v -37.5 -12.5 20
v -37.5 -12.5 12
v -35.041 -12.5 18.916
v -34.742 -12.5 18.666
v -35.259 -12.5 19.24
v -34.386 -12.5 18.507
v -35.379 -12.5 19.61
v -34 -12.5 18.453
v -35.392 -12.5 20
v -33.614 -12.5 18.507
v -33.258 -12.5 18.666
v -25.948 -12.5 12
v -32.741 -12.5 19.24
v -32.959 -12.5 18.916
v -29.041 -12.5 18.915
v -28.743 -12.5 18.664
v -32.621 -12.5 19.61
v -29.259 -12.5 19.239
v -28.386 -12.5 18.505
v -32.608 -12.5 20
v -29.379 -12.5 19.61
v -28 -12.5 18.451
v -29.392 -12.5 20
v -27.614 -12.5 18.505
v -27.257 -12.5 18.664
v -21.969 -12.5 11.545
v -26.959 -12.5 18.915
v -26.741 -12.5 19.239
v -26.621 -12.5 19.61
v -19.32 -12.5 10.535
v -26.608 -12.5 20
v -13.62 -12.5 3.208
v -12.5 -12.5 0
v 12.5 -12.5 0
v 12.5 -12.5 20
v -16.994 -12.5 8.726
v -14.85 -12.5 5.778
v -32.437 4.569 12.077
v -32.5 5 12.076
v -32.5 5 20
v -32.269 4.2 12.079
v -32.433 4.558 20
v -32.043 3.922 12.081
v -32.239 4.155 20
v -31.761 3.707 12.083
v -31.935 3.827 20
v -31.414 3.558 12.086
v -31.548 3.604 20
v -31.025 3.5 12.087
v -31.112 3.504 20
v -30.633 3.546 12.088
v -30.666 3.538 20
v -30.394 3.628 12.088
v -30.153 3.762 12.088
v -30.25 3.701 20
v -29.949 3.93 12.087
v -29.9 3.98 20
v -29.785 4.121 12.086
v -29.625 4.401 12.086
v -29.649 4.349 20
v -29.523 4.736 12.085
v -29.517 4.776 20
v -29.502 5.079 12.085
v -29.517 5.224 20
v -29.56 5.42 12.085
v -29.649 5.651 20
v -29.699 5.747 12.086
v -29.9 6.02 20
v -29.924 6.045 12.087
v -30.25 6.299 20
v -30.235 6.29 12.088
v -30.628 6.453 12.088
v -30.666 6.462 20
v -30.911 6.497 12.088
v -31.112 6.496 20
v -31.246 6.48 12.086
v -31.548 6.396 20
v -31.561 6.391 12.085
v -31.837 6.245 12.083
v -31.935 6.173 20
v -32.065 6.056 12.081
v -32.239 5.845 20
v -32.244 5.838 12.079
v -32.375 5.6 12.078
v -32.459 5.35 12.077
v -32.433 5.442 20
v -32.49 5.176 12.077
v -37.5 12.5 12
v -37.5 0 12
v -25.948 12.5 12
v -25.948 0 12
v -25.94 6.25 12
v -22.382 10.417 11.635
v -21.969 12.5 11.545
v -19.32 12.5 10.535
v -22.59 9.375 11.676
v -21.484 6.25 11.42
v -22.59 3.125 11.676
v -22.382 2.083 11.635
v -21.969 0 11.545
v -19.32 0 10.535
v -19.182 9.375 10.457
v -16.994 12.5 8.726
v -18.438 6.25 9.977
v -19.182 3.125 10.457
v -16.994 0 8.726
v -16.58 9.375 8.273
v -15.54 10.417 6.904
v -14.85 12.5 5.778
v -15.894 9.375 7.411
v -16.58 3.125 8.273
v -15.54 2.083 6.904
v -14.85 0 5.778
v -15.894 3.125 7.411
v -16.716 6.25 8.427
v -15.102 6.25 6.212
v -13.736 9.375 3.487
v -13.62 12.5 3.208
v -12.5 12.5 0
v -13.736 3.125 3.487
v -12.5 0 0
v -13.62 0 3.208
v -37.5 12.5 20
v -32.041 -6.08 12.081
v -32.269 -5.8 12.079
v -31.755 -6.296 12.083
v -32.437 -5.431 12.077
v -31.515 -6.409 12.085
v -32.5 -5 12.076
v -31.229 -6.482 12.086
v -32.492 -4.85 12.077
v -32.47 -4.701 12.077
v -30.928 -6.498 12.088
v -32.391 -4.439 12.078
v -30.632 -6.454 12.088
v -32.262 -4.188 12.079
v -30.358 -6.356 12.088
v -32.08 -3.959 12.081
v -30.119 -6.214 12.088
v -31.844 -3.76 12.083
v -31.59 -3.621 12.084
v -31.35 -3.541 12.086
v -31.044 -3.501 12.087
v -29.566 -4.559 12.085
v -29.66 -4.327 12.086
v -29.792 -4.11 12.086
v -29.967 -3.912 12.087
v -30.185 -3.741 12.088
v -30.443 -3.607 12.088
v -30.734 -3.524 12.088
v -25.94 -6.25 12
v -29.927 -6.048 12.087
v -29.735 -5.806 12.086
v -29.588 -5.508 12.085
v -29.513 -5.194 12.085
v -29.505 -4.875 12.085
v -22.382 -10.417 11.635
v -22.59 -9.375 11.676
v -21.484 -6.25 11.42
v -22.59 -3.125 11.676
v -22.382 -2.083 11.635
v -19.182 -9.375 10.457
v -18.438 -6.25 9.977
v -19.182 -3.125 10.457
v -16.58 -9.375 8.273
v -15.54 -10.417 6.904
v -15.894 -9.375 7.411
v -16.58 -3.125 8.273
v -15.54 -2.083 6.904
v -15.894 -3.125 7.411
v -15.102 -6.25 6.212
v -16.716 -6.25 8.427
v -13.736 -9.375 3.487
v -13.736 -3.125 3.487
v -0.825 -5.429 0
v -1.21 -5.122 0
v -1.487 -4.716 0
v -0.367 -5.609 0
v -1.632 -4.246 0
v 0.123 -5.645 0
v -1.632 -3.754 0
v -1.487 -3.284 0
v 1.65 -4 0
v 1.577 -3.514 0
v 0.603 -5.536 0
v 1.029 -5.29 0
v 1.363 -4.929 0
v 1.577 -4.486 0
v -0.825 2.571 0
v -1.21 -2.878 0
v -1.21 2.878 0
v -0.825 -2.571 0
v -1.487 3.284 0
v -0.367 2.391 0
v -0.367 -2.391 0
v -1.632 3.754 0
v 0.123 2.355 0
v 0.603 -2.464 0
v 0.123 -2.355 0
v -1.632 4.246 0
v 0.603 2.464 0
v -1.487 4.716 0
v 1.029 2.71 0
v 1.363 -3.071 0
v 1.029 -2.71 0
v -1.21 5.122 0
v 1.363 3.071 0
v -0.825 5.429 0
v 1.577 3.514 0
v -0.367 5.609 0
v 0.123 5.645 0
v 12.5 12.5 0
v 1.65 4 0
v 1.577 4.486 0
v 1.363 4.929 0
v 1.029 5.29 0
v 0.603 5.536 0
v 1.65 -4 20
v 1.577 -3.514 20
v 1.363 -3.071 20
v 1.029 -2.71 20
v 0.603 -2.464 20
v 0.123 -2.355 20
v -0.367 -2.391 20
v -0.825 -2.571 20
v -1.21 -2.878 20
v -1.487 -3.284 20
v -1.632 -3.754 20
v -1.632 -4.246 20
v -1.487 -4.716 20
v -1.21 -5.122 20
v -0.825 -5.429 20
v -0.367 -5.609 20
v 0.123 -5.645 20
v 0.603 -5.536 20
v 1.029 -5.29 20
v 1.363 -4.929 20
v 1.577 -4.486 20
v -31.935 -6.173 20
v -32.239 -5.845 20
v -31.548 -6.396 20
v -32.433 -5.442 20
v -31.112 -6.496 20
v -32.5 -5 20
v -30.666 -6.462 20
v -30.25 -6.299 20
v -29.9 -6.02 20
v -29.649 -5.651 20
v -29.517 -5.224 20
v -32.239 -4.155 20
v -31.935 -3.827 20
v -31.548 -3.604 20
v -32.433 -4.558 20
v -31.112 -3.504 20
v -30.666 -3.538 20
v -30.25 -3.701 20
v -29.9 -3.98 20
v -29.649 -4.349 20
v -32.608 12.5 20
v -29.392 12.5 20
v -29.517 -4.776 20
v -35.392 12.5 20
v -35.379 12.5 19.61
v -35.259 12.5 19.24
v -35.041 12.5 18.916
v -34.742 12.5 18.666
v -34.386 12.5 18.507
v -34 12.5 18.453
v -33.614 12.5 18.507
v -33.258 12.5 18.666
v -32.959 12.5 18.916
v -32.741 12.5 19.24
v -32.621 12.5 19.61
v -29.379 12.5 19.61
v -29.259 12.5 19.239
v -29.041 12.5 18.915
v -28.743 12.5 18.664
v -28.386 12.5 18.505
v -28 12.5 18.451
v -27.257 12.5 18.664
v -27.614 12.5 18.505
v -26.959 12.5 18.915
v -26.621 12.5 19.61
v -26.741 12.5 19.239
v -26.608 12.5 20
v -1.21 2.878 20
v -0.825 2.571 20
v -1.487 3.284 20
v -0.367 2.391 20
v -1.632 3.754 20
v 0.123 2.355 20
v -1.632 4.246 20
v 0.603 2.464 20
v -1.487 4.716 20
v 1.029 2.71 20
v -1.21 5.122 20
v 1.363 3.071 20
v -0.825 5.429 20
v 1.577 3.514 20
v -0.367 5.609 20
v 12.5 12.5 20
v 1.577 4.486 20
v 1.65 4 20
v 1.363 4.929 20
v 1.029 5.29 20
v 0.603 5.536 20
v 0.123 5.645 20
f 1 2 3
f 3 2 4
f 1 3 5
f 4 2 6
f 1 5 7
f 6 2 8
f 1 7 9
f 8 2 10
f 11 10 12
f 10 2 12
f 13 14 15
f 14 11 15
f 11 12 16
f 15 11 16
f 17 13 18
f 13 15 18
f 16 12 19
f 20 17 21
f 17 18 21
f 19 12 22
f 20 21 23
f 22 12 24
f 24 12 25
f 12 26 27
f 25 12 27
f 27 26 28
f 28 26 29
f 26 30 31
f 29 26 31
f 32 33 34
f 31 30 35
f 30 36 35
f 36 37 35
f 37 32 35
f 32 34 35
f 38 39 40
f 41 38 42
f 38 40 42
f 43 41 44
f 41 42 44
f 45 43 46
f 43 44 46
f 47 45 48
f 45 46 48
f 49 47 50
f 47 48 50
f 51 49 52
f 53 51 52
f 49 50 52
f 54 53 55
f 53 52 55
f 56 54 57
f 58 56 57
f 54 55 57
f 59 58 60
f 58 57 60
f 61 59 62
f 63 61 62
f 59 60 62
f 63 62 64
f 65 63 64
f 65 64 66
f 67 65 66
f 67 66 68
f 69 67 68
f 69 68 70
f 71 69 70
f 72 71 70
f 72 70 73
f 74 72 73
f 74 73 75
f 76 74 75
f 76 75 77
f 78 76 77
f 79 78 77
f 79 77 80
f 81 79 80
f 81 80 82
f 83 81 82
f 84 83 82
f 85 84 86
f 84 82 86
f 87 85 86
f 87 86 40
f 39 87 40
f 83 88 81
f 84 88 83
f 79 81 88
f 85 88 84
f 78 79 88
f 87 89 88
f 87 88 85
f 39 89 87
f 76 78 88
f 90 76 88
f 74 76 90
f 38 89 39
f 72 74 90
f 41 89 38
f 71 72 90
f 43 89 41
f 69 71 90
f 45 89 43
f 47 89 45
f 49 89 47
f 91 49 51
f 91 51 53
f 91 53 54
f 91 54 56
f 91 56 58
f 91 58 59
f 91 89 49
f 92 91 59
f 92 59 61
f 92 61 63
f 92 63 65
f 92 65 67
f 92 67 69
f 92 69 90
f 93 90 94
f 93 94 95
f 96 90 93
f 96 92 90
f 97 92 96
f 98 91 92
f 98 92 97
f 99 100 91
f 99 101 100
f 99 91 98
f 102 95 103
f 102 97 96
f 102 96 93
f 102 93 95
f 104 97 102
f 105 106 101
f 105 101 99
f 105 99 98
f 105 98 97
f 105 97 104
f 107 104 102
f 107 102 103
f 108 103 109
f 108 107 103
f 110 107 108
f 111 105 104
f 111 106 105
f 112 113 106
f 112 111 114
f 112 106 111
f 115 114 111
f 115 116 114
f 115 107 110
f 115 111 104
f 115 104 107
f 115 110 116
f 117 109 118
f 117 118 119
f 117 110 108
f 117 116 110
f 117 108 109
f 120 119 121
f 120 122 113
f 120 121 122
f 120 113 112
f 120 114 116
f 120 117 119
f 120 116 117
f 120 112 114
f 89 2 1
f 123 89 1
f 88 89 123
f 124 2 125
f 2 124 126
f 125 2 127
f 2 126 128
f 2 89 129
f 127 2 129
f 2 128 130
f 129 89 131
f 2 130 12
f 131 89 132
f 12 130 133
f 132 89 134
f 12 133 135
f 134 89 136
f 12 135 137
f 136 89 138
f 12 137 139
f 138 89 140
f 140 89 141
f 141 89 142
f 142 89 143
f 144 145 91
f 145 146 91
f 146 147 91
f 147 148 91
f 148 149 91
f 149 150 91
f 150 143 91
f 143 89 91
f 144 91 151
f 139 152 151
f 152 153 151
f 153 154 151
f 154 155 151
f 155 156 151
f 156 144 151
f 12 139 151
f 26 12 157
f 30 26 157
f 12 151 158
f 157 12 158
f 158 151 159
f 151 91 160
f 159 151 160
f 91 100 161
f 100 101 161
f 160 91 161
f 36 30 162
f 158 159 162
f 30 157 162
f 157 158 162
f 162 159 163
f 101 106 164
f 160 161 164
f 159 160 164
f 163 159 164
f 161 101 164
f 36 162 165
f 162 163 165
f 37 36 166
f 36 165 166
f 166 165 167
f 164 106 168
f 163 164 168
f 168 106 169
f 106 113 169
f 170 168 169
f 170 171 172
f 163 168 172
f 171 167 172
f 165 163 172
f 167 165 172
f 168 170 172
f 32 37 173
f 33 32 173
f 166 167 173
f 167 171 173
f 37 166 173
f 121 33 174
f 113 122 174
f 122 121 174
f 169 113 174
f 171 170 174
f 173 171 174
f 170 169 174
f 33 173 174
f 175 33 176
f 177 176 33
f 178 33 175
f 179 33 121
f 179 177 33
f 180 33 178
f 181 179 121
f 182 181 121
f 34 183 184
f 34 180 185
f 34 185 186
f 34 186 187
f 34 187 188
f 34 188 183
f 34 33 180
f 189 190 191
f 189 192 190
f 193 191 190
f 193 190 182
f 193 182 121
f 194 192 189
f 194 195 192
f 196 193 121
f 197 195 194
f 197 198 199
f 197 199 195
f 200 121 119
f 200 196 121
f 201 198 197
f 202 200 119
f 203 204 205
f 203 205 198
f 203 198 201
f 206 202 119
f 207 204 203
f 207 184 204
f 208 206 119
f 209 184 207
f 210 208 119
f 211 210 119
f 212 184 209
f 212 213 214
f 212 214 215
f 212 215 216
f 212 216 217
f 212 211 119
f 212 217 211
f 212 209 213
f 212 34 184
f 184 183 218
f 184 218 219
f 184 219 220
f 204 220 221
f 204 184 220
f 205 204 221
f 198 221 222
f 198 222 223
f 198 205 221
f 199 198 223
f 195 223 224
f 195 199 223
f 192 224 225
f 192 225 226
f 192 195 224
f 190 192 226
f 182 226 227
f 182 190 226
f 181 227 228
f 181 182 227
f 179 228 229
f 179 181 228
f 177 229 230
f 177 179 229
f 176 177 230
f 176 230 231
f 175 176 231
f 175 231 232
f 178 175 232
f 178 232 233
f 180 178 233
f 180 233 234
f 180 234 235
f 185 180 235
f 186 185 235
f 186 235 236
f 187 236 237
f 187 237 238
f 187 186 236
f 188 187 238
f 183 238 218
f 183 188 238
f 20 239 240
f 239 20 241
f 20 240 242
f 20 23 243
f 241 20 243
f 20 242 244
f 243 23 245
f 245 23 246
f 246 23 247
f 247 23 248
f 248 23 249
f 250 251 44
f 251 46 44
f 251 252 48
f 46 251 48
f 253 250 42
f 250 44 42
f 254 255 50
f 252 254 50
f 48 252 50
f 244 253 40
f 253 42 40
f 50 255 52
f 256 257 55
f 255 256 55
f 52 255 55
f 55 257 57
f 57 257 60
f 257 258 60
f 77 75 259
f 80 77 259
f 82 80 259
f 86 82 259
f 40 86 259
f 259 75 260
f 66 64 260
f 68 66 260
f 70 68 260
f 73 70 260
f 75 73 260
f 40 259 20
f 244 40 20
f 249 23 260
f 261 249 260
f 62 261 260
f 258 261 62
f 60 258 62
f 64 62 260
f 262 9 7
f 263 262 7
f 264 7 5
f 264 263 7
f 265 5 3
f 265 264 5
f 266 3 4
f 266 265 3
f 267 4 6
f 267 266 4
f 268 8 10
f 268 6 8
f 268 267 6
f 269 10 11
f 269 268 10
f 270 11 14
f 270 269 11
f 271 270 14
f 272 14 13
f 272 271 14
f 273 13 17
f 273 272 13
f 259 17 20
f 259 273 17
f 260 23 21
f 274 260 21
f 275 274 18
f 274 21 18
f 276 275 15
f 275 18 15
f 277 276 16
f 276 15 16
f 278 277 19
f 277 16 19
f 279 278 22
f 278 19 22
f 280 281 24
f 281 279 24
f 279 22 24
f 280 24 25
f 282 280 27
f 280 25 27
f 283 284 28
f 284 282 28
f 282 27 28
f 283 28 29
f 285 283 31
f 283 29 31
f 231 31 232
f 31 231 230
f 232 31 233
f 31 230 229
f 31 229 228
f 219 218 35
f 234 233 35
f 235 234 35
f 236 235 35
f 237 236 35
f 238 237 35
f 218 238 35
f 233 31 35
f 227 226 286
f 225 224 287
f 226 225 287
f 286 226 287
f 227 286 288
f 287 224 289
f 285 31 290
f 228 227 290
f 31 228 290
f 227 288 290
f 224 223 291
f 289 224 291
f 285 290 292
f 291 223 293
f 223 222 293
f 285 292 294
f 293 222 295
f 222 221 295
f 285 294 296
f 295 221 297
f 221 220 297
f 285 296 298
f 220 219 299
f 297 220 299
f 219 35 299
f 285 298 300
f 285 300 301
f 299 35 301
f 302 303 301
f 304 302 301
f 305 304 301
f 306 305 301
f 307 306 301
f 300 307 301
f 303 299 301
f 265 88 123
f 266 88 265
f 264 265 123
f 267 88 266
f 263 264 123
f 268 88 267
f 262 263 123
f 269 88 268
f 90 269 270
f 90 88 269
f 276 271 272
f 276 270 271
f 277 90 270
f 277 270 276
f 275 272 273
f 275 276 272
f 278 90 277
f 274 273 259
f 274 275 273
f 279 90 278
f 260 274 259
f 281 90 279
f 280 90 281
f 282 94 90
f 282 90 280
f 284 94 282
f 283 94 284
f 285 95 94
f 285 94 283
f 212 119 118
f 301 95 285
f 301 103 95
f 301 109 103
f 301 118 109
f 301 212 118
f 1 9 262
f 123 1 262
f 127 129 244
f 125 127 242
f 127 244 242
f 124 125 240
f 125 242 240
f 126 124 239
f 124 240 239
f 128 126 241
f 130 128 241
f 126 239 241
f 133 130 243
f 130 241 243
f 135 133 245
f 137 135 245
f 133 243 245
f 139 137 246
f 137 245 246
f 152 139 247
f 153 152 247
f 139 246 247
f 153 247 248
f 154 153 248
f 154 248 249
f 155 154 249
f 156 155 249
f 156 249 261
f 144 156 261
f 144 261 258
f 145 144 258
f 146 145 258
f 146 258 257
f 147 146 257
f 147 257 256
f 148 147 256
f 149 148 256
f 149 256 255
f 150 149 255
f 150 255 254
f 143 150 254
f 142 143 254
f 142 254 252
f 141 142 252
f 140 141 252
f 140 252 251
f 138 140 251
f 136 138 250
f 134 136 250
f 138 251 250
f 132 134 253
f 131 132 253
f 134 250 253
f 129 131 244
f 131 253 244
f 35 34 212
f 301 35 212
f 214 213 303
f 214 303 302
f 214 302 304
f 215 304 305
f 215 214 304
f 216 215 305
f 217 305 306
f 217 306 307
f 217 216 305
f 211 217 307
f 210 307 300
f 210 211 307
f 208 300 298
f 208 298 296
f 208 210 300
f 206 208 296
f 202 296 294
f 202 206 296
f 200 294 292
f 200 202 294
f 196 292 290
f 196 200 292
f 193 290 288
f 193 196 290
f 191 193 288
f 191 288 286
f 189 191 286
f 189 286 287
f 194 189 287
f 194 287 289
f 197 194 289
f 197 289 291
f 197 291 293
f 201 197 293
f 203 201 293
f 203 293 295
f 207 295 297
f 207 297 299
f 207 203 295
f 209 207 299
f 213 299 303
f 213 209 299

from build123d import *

# Parameters (mm, degrees)
F0_W     = 25
F0_H     = 25
F0_R     = 1.65
F1_DEPTH = 20
F2_DEPTH = 25
F3_R     = 1.4
F4_DEPTH = 12.5
F6_D     = 3


with BuildPart() as f1:
    # F0 (on Top) → F1 (new body)
    with BuildSketch(Plane.XY):
        Rectangle(F0_W, F0_H)
        with Locations((0, -4)):
            Circle(F0_R, mode=Mode.SUBTRACT)
        with Locations((0, 4)):
            Circle(F0_R, mode=Mode.SUBTRACT)
    extrude(amount=F1_DEPTH)

    # F2 (add): a face of the model
    f2_faces = [f1.faces().sort_by_distance(p)[0] for p in [
        (-12.5, 0, 10),
    ]]
    extrude(f2_faces, amount=F2_DEPTH)

    # F3 (on Front) → F4 (cut, symmetric)
    with BuildSketch(Plane.XZ):
        with BuildLine():
            add(Edge.make_bspline(
                [(-37.5, 12), (-33.778607057, 12.0509013714), (-25.1001296566, 12.3187041592), (-15.8211888541, 11.1248698681), (-12.5, 0)],
                knots=[0, 0, 0, 0, 0.44474528, 1, 1, 1, 1], degree=3))
            Line((-37.5, 12), (-37.5, 0))
            Line((-37.5, 0), (-12.5, 0))
        make_face()
        with Locations((-34, 19.8526792228)):
            Circle(F3_R)
        with Locations((-28, 19.8505632579)):
            Circle(F3_R)
    extrude(amount=F4_DEPTH, both=True, mode=Mode.SUBTRACT)

    # F6 (through all)
    with Locations(Plane(origin=(0, 0, 0), x_dir=(1, 0, 0), z_dir=(0, 0, -1))):
        with Locations((-31, 5), (-31, -5)):
            Hole(F6_D / 2)


solid = f1.part
